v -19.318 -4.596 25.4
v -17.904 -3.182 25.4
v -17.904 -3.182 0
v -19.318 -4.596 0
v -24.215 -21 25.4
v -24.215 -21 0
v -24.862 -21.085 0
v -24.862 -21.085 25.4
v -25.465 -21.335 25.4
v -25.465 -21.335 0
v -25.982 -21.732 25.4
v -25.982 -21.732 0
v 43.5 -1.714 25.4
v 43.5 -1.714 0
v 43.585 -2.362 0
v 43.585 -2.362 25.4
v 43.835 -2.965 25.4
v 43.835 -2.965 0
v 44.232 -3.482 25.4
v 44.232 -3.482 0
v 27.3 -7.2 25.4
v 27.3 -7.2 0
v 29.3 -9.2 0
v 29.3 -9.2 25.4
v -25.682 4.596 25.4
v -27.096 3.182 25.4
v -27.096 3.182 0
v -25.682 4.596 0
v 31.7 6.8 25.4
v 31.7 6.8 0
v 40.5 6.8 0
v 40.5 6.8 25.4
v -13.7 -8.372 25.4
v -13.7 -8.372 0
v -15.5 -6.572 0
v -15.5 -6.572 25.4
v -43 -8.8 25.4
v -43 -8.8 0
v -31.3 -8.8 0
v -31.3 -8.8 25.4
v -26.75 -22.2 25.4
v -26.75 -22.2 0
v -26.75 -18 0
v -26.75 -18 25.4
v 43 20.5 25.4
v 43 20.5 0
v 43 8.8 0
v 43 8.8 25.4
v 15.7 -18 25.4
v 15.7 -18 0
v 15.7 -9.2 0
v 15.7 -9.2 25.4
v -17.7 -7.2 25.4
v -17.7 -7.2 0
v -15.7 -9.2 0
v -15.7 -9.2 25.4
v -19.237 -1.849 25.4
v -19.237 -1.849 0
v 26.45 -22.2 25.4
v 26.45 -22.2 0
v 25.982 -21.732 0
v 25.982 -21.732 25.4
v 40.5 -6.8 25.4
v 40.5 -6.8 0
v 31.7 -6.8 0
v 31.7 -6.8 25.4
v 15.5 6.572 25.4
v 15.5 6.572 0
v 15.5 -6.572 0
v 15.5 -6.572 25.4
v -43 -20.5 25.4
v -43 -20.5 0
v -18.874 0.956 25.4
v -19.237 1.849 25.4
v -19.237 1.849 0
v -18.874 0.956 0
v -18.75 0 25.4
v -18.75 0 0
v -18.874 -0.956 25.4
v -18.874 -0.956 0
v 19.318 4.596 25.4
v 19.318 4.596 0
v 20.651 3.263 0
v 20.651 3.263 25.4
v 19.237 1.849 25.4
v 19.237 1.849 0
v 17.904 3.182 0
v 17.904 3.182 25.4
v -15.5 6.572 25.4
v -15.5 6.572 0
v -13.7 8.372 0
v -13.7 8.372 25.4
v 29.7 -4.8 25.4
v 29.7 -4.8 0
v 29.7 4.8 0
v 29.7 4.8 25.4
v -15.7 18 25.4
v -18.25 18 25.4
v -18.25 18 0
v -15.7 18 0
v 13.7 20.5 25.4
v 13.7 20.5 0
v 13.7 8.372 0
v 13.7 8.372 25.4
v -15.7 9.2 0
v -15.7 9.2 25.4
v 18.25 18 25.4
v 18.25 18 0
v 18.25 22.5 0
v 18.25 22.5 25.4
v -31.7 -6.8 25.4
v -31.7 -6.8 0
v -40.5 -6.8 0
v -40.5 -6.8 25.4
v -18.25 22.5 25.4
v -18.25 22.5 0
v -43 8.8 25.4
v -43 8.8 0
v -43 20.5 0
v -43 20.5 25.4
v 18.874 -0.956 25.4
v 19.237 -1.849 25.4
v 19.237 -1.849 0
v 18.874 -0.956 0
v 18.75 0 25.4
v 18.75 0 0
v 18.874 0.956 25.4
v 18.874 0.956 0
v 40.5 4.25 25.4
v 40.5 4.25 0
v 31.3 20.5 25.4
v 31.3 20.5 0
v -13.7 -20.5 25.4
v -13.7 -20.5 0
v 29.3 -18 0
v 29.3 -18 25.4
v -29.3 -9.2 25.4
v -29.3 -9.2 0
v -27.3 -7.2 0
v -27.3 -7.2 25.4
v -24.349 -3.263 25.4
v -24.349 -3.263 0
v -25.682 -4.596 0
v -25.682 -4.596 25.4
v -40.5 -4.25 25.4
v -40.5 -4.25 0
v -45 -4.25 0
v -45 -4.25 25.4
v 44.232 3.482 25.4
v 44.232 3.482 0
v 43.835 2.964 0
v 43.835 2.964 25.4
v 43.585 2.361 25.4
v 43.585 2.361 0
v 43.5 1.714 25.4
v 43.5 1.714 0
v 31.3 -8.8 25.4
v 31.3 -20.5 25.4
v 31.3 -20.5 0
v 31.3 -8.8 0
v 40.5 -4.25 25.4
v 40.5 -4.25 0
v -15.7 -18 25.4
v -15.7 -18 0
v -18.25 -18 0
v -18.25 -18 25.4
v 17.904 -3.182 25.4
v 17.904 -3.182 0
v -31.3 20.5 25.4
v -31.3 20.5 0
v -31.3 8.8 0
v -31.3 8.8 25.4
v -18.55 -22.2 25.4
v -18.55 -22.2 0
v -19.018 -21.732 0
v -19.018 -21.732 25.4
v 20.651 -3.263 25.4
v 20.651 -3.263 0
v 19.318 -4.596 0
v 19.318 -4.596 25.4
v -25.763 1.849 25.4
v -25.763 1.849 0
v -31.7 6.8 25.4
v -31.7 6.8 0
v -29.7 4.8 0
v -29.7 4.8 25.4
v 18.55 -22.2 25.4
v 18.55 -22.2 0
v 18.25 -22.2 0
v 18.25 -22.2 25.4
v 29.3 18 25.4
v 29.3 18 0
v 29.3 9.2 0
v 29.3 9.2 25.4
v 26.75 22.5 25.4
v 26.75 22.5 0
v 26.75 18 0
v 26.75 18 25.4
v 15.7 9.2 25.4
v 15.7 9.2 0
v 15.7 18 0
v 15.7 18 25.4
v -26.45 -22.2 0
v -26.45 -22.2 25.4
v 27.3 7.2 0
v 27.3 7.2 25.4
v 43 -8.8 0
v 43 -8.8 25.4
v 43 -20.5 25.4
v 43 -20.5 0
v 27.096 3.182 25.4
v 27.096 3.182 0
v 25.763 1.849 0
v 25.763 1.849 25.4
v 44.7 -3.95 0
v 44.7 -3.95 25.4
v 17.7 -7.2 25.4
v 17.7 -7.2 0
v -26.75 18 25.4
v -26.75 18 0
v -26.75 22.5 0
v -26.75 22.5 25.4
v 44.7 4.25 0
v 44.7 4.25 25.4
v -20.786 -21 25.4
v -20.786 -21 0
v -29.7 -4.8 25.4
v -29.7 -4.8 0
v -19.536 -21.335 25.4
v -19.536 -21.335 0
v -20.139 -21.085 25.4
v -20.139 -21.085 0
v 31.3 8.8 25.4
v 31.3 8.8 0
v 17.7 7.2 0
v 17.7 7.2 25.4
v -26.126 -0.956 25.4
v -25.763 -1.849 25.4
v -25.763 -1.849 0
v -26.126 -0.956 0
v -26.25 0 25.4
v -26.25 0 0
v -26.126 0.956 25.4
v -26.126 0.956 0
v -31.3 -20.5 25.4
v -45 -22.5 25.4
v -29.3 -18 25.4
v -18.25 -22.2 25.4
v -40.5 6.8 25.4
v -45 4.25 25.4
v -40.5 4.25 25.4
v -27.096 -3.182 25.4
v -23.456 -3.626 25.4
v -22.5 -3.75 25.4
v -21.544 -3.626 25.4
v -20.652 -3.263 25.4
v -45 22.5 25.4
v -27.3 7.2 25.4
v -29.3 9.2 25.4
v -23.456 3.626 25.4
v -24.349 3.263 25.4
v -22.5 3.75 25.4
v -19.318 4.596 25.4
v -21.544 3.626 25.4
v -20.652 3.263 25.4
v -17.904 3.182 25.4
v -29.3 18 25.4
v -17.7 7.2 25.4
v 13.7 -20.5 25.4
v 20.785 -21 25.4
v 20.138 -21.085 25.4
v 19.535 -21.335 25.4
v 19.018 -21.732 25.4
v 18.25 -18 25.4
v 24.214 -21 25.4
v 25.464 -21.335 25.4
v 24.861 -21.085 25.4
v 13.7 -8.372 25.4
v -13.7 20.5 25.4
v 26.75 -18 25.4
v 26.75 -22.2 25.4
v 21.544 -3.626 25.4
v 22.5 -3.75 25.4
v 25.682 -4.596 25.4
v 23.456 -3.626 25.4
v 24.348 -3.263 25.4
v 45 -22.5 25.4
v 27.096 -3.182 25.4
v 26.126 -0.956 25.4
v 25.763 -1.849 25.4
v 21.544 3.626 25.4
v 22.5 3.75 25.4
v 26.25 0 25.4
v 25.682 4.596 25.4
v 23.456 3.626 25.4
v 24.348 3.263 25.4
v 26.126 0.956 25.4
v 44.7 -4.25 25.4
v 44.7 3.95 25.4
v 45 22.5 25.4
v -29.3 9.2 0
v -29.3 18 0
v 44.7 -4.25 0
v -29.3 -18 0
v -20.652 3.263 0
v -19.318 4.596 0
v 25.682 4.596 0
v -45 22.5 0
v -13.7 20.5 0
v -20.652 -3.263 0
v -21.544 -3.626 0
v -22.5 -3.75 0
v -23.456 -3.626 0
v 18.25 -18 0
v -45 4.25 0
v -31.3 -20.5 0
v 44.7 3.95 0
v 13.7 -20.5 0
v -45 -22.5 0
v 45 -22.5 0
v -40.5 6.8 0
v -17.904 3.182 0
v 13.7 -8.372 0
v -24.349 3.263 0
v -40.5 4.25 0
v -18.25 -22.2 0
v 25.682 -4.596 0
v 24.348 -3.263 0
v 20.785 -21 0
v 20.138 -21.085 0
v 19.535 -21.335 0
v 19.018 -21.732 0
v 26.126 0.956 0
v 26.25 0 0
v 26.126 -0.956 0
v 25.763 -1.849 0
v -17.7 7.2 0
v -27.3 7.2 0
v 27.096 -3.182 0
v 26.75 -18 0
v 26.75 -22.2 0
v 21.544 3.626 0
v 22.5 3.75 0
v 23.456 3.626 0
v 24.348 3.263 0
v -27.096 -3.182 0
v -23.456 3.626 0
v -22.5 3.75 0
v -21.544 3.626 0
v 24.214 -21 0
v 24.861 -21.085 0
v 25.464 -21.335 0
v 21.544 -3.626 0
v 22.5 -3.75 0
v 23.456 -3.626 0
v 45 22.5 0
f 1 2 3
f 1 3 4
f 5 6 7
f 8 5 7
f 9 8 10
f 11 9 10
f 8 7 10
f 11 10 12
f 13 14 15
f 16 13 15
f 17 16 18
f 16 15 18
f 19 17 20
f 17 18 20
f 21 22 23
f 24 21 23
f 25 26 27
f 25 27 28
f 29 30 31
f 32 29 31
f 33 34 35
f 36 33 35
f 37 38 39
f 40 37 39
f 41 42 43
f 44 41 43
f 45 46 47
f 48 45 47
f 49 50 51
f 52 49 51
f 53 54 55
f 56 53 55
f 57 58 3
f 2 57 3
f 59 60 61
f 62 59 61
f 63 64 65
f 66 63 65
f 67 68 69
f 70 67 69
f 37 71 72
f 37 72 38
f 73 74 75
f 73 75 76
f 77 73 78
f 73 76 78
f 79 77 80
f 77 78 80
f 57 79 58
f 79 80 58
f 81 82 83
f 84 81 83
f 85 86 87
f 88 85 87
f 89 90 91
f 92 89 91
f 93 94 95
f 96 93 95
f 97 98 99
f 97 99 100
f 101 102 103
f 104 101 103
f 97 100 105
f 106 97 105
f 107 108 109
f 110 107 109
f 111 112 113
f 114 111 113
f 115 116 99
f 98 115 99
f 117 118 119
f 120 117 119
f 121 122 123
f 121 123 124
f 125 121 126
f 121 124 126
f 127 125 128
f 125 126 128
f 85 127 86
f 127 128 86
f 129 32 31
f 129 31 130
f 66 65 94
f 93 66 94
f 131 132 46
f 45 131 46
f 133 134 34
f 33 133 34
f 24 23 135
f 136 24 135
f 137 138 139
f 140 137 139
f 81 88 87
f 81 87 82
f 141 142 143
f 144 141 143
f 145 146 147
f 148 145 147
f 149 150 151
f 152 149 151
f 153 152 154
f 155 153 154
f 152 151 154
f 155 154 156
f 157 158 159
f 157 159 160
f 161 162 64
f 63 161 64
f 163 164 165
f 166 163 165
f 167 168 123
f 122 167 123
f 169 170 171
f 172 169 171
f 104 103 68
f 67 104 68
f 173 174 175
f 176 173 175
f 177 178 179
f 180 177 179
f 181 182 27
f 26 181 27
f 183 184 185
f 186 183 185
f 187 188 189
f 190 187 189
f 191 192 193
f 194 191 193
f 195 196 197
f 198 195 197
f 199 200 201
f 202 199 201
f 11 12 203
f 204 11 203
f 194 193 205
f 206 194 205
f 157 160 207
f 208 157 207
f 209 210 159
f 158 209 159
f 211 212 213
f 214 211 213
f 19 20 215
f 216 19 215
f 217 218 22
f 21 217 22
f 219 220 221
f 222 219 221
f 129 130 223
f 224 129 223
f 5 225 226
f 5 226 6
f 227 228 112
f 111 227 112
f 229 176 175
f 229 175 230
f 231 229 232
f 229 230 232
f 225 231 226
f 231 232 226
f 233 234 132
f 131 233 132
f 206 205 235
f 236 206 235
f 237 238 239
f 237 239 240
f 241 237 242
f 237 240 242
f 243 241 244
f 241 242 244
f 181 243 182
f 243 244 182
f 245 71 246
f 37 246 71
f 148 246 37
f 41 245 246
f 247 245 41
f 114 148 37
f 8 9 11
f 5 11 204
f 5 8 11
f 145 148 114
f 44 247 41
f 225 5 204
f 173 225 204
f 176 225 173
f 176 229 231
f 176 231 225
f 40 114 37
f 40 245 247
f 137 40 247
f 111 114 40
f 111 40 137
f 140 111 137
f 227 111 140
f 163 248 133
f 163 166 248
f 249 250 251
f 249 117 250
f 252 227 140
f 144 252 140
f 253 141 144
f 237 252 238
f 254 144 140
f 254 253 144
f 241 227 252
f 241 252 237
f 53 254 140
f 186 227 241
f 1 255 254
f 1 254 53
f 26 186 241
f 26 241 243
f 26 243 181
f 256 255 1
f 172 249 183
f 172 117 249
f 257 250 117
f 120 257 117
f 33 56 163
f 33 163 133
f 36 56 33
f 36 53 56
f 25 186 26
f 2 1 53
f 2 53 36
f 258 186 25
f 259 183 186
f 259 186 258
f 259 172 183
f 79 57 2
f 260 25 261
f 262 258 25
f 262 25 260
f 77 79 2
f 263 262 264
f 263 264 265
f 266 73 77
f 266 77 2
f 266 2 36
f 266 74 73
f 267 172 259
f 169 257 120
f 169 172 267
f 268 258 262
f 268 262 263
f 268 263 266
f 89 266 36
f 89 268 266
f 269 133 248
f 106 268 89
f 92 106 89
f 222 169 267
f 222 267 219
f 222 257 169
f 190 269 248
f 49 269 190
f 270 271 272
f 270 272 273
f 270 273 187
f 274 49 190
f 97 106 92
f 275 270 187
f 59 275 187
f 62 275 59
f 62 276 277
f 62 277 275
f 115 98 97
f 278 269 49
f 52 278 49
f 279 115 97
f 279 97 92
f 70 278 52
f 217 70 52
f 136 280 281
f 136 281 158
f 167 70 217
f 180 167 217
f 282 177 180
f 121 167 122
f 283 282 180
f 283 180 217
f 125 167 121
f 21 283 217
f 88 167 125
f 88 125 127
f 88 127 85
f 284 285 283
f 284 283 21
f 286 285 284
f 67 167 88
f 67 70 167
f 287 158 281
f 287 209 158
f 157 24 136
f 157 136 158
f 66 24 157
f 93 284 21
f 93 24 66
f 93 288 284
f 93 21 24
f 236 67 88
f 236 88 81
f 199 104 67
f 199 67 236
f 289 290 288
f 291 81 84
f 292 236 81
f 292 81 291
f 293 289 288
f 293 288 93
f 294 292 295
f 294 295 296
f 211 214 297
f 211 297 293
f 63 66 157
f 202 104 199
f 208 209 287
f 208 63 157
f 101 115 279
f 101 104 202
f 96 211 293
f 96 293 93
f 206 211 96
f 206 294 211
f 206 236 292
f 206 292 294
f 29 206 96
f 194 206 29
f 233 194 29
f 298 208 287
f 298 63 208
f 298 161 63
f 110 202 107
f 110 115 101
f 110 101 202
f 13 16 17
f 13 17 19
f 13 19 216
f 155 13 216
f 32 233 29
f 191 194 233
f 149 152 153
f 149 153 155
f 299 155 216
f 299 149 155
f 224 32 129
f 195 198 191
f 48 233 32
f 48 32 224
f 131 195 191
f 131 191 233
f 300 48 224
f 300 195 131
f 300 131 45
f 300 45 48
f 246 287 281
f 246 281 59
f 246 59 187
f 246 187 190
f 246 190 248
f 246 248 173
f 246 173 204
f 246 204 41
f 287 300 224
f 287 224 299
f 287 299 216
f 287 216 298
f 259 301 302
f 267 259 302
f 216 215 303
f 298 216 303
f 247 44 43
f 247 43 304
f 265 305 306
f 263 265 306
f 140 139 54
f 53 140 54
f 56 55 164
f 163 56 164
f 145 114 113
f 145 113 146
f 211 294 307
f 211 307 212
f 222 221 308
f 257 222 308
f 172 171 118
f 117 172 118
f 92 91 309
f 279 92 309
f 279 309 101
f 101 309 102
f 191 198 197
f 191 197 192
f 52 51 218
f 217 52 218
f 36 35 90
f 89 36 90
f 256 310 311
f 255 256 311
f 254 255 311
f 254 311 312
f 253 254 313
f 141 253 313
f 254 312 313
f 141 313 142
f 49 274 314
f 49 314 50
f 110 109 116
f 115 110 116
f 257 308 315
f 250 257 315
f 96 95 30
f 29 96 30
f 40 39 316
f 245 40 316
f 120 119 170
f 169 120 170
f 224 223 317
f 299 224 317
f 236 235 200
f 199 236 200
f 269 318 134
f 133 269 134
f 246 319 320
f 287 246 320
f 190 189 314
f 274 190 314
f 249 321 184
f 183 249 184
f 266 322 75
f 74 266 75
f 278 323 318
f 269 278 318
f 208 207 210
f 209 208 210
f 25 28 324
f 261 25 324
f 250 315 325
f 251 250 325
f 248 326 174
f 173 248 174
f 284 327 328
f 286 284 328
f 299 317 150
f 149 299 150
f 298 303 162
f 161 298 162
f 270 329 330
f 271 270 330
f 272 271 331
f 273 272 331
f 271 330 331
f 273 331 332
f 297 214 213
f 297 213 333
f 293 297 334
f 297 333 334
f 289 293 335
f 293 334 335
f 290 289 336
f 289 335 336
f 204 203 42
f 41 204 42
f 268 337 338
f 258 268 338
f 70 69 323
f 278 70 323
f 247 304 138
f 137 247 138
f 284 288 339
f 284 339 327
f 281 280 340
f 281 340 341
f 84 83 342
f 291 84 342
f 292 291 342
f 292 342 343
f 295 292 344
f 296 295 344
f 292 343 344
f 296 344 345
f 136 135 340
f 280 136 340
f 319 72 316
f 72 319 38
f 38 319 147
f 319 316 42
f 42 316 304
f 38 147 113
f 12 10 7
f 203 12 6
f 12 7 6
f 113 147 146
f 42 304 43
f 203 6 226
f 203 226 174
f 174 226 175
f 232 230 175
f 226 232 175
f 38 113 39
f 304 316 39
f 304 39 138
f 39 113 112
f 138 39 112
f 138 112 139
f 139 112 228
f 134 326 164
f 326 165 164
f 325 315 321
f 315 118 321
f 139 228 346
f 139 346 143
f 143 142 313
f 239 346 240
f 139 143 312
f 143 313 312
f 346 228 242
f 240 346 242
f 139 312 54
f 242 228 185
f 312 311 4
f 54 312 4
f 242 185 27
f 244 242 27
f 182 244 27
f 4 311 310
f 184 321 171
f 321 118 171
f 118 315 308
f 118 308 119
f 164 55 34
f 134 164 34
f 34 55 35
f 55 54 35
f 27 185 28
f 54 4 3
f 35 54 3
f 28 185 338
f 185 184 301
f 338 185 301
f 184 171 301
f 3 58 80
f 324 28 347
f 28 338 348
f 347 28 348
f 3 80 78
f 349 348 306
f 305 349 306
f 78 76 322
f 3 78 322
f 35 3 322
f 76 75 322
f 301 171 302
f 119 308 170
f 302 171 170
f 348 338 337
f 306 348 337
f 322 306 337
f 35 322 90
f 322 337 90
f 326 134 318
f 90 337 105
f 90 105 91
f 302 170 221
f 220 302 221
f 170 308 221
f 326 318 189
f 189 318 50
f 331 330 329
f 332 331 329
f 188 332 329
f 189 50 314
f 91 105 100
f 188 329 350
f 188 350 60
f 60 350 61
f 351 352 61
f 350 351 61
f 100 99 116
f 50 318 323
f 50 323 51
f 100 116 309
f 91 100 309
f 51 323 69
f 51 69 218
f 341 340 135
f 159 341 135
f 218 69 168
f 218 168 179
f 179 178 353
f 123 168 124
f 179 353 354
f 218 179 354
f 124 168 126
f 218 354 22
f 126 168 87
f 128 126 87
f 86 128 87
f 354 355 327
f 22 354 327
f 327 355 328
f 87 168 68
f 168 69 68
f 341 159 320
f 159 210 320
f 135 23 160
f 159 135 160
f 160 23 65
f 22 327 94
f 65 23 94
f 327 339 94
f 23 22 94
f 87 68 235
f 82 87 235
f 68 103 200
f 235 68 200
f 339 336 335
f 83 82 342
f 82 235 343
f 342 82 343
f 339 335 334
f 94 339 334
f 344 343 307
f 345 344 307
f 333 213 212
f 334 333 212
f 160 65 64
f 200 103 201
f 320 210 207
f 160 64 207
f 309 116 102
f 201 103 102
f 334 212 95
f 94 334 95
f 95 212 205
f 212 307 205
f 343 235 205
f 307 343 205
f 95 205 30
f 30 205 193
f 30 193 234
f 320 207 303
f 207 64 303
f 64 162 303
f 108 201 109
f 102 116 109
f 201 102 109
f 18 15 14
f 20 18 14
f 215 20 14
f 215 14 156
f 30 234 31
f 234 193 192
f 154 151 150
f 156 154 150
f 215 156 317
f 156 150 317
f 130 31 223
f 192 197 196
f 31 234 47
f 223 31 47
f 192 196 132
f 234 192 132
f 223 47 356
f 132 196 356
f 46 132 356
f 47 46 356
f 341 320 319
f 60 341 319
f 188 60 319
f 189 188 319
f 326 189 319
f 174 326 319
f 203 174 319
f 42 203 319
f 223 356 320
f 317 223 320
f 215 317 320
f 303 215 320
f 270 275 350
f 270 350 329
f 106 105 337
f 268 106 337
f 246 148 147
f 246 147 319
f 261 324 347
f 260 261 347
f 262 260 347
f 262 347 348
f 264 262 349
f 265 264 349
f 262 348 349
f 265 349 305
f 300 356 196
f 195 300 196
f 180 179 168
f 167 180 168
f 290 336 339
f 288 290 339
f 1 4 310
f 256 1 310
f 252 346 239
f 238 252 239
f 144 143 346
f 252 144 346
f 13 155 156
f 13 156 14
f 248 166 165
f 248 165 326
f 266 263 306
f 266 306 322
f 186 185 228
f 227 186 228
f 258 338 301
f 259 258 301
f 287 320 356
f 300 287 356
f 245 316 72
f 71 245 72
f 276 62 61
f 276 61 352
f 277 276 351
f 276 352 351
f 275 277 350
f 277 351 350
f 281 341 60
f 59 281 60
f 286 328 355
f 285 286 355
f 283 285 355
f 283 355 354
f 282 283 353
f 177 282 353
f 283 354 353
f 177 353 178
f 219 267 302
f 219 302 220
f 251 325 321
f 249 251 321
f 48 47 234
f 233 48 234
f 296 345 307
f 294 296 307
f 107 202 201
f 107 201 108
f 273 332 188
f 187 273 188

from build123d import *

# Parameters (mm, degrees)
BOSS_EXTRUDE1_DEPTH = 25.4


with BuildPart() as part:
    # Sketch1 → Boss-Extrude1 (new body)
    with BuildSketch(Plane.XY):
        Polygon((-45.000100804, -22.499999999), (44.999899202, -22.499999999), (44.999899202, 22.5), (26.749899972, 22.5), (26.749899972, 17.999999372), (29.299918194, 17.999999372), (29.299918002, 9.200011166), (27.299917722, 7.200011061), (17.699911829, 7.200011271), (15.699911706, 9.200011568), (15.699911899, 17.999999102), (18.249899884, 17.999999102), (18.249899884, 22.5), (-18.250100028, 22.5), (-18.250100028, 17.999999372), (-15.700081806, 17.999999372), (-15.700081998, 9.200011166), (-17.700082278, 7.200011061), (-27.300088171, 7.200011271), (-29.300088294, 9.200011568), (-29.300088101, 17.999999102), (-26.750100116, 17.999999102), (-26.750100116, 22.5), (-45.000100804, 22.5), (-45.000100804, 4.250000064), (-40.500099403, 4.250000064), (-40.500099403, 6.800018286), (-31.700111197, 6.800018094), (-29.700111092, 4.800017814), (-29.700111302, -4.79998808), (-31.700111599, -6.799988202), (-40.500099133, -6.79998801), (-40.500099133, -4.250000024), (-45.000100804, -4.250000024), align=None)
        with BuildLine():
            Line((19.237162182, 1.848524255), (17.903705922, 3.181980515))
            Line((17.903705922, 3.181980515), (19.317919485, 4.596194078))
            Line((19.317919485, 4.596194078), (20.651375745, 3.262737818))
            ThreePointArc((20.651375745, 3.262737818), (22.4999, 3.749999999), (24.348424255, 3.262737818))
            Line((24.348424255, 3.262737818), (25.681880515, 4.596194078))
            Line((25.681880515, 4.596194078), (27.096094078, 3.181980515))
            Line((27.096094078, 3.181980515), (25.762637818, 1.848524255))
            ThreePointArc((25.762637818, 1.848524255), (26.249899999, 0), (25.762637818, -1.848524255))
            Line((25.762637818, -1.848524255), (27.096094078, -3.181980515))
            Line((27.096094078, -3.181980515), (25.681880515, -4.596194078))
            Line((25.681880515, -4.596194078), (24.348424255, -3.262737818))
            ThreePointArc((24.348424255, -3.262737818), (22.4999, -3.749999999), (20.651375745, -3.262737818))
            Line((20.651375745, -3.262737818), (19.317919483, -4.596194079))
            Line((19.317919483, -4.596194079), (17.90370592, -3.181980517))
            Line((17.90370592, -3.181980517), (19.237162182, -1.848524255))
            ThreePointArc((19.237162182, -1.848524255), (18.749900001, 0), (19.237162182, 1.848524255))
        make_face(mode=Mode.SUBTRACT)
        with BuildLine():
            Line((-25.682080517, -4.596194079), (-27.09629408, -3.181980517))
            Line((-27.09629408, -3.181980517), (-25.762837818, -1.848524255))
            ThreePointArc((-25.762837818, -1.848524255), (-26.250099999, 0), (-25.762837818, 1.848524255))
            Line((-25.762837818, 1.848524255), (-27.096294078, 3.181980515))
            Line((-27.096294078, 3.181980515), (-25.682080515, 4.596194078))
            Line((-25.682080515, 4.596194078), (-24.348624255, 3.262737818))
            ThreePointArc((-24.348624255, 3.262737818), (-22.5001, 3.749999999), (-20.651575745, 3.262737818))
            Line((-20.651575745, 3.262737818), (-19.318119485, 4.596194078))
            Line((-19.318119485, 4.596194078), (-17.903905922, 3.181980515))
            Line((-17.903905922, 3.181980515), (-19.237362182, 1.848524255))
            ThreePointArc((-19.237362182, 1.848524255), (-18.750100001, 0), (-19.237362182, -1.848524255))
            Line((-19.237362182, -1.848524255), (-17.903905922, -3.181980515))
            Line((-17.903905922, -3.181980515), (-19.318119485, -4.596194078))
            Line((-19.318119485, -4.596194078), (-20.651575745, -3.262737818))
            ThreePointArc((-20.651575745, -3.262737818), (-22.5001, -3.749999999), (-24.348624255, -3.262737818))
            Line((-24.348624255, -3.262737818), (-25.682080517, -4.596194079))
        make_face(mode=Mode.SUBTRACT)
        Polygon((42.999881918, 20.500011944), (42.999881663, 8.8), (31.299899711, 8.8), (31.299899711, 20.5000122), align=None, mode=Mode.SUBTRACT)
        Polygon((42.999881952, -20.5), (31.2999, -20.5), (31.2999, -8.7999878), (42.999882208, -8.799988056), align=None, mode=Mode.SUBTRACT)
        Polygon((-31.300117792, -8.799988056), (-31.300118048, -20.5), (-43.0001, -20.5), (-43.0001, -8.7999878), align=None, mode=Mode.SUBTRACT)
        Polygon((-31.300118048, 8.8), (-43.0001, 8.8), (-43.0001, 20.5000122), (-31.300117792, 20.500011944), align=None, mode=Mode.SUBTRACT)
        with BuildLine():
            Line((-26.750099976, -22.200012315), (-26.750099976, -17.999999113))
            Line((-26.750099976, -17.999999113), (-29.300118194, -17.999999113))
            Line((-29.300118194, -17.999999113), (-29.300118002, -9.200011166))
            Line((-29.300118002, -9.200011166), (-27.300117722, -7.200011061))
            Line((-27.300117722, -7.200011061), (-17.700111829, -7.200011271))
            Line((-17.700111829, -7.200011271), (-15.700111706, -9.200011568))
            Line((-15.700111706, -9.200011568), (-15.700111899, -17.999998844))
            Line((-15.700111899, -17.999998844), (-18.250099887, -17.999998844))
            Line((-18.250099887, -17.999998844), (-18.250099887, -22.20001241))
            Line((-18.250099887, -22.20001241), (-18.550118283, -22.20001241))
            Line((-18.550118283, -22.20001241), (-19.017895639, -21.73223406))
            ThreePointArc((-19.017895639, -21.73223406), (-19.828954662, -21.190300811), (-20.785664471, -20.999999134))
            Line((-20.785664471, -20.999999134), (-24.214566009, -20.999999134))
            ThreePointArc((-24.214566009, -20.999999134), (-25.171313387, -21.190316374), (-25.982392349, -21.732291572))
            Line((-25.982392349, -21.732291572), (-26.450081665, -22.200012315))
            Line((-26.450081665, -22.200012315), (-26.750099976, -22.200012315))
        make_face(mode=Mode.SUBTRACT)
        with BuildLine():
            Line((18.249900024, -22.200012315), (18.249900024, -17.999999113))
            Line((18.249900024, -17.999999113), (15.699881806, -17.999999113))
            Line((15.699881806, -17.999999113), (15.699881998, -9.200011166))
            Line((15.699881998, -9.200011166), (17.699882278, -7.200011061))
            Line((17.699882278, -7.200011061), (27.299888171, -7.200011271))
            Line((27.299888171, -7.200011271), (29.299888294, -9.200011568))
            Line((29.299888294, -9.200011568), (29.299888101, -17.999998844))
            Line((29.299888101, -17.999998844), (26.749900113, -17.999998844))
            Line((26.749900113, -17.999998844), (26.749900113, -22.20001241))
            Line((26.749900113, -22.20001241), (26.449881717, -22.20001241))
            Line((26.449881717, -22.20001241), (25.982104361, -21.73223406))
            ThreePointArc((25.982104361, -21.73223406), (25.171045338, -21.190300811), (24.214335529, -20.999999134))
            Line((24.214335529, -20.999999134), (20.785433991, -20.999999134))
            ThreePointArc((20.785433991, -20.999999134), (19.828686613, -21.190316374), (19.017607651, -21.732291572))
            Line((19.017607651, -21.732291572), (18.549918335, -22.200012315))
            Line((18.549918335, -22.200012315), (18.249900024, -22.200012315))
        make_face(mode=Mode.SUBTRACT)
        with BuildLine():
            Line((31.699911166, -6.800018002), (29.699911061, -4.800017722))
            Line((29.699911061, -4.800017722), (29.699911271, 4.799988171))
            Line((29.699911271, 4.799988171), (31.699911568, 6.799988294))
            Line((31.699911568, 6.799988294), (40.499898813, 6.799988101))
            Line((40.499898813, 6.799988101), (40.499898813, 4.250000116))
            Line((40.499898813, 4.250000116), (44.69991241, 4.250000116))
            Line((44.69991241, 4.250000116), (44.69991241, 3.949981717))
            Line((44.69991241, 3.949981717), (44.23213406, 3.482204361))
            ThreePointArc((44.23213406, 3.482204361), (43.690200811, 2.671145338), (43.499899134, 1.714435529))
            Line((43.499899134, 1.714435529), (43.499899134, -1.714466009))
            ThreePointArc((43.499899134, -1.714466009), (43.690216374, -2.671213387), (44.232191572, -3.482292349))
            Line((44.232191572, -3.482292349), (44.699912315, -3.949981665))
            Line((44.699912315, -3.949981665), (44.699912315, -4.249999976))
            Line((44.699912315, -4.249999976), (40.499899113, -4.249999976))
            Line((40.499899113, -4.249999976), (40.499899113, -6.800018194))
            Line((40.499899113, -6.800018194), (31.699911166, -6.800018002))
        make_face(mode=Mode.SUBTRACT)
        Polygon((13.699911396, 20.5), (13.699911131, 8.37158507), (15.4999, 6.571596043), (15.4999, -6.571596043), (13.699910134, -8.371586067), (13.699910399, -20.5), (-13.7001122, -20.5), (-13.700111724, -8.371584476), (-15.5001, -6.571596043), (-15.5001, 6.571596848), (-13.700112474, 8.371584531), (-13.700112739, 20.5), align=None, mode=Mode.SUBTRACT)
    extrude(amount=BOSS_EXTRUDE1_DEPTH)


solid = part.part
